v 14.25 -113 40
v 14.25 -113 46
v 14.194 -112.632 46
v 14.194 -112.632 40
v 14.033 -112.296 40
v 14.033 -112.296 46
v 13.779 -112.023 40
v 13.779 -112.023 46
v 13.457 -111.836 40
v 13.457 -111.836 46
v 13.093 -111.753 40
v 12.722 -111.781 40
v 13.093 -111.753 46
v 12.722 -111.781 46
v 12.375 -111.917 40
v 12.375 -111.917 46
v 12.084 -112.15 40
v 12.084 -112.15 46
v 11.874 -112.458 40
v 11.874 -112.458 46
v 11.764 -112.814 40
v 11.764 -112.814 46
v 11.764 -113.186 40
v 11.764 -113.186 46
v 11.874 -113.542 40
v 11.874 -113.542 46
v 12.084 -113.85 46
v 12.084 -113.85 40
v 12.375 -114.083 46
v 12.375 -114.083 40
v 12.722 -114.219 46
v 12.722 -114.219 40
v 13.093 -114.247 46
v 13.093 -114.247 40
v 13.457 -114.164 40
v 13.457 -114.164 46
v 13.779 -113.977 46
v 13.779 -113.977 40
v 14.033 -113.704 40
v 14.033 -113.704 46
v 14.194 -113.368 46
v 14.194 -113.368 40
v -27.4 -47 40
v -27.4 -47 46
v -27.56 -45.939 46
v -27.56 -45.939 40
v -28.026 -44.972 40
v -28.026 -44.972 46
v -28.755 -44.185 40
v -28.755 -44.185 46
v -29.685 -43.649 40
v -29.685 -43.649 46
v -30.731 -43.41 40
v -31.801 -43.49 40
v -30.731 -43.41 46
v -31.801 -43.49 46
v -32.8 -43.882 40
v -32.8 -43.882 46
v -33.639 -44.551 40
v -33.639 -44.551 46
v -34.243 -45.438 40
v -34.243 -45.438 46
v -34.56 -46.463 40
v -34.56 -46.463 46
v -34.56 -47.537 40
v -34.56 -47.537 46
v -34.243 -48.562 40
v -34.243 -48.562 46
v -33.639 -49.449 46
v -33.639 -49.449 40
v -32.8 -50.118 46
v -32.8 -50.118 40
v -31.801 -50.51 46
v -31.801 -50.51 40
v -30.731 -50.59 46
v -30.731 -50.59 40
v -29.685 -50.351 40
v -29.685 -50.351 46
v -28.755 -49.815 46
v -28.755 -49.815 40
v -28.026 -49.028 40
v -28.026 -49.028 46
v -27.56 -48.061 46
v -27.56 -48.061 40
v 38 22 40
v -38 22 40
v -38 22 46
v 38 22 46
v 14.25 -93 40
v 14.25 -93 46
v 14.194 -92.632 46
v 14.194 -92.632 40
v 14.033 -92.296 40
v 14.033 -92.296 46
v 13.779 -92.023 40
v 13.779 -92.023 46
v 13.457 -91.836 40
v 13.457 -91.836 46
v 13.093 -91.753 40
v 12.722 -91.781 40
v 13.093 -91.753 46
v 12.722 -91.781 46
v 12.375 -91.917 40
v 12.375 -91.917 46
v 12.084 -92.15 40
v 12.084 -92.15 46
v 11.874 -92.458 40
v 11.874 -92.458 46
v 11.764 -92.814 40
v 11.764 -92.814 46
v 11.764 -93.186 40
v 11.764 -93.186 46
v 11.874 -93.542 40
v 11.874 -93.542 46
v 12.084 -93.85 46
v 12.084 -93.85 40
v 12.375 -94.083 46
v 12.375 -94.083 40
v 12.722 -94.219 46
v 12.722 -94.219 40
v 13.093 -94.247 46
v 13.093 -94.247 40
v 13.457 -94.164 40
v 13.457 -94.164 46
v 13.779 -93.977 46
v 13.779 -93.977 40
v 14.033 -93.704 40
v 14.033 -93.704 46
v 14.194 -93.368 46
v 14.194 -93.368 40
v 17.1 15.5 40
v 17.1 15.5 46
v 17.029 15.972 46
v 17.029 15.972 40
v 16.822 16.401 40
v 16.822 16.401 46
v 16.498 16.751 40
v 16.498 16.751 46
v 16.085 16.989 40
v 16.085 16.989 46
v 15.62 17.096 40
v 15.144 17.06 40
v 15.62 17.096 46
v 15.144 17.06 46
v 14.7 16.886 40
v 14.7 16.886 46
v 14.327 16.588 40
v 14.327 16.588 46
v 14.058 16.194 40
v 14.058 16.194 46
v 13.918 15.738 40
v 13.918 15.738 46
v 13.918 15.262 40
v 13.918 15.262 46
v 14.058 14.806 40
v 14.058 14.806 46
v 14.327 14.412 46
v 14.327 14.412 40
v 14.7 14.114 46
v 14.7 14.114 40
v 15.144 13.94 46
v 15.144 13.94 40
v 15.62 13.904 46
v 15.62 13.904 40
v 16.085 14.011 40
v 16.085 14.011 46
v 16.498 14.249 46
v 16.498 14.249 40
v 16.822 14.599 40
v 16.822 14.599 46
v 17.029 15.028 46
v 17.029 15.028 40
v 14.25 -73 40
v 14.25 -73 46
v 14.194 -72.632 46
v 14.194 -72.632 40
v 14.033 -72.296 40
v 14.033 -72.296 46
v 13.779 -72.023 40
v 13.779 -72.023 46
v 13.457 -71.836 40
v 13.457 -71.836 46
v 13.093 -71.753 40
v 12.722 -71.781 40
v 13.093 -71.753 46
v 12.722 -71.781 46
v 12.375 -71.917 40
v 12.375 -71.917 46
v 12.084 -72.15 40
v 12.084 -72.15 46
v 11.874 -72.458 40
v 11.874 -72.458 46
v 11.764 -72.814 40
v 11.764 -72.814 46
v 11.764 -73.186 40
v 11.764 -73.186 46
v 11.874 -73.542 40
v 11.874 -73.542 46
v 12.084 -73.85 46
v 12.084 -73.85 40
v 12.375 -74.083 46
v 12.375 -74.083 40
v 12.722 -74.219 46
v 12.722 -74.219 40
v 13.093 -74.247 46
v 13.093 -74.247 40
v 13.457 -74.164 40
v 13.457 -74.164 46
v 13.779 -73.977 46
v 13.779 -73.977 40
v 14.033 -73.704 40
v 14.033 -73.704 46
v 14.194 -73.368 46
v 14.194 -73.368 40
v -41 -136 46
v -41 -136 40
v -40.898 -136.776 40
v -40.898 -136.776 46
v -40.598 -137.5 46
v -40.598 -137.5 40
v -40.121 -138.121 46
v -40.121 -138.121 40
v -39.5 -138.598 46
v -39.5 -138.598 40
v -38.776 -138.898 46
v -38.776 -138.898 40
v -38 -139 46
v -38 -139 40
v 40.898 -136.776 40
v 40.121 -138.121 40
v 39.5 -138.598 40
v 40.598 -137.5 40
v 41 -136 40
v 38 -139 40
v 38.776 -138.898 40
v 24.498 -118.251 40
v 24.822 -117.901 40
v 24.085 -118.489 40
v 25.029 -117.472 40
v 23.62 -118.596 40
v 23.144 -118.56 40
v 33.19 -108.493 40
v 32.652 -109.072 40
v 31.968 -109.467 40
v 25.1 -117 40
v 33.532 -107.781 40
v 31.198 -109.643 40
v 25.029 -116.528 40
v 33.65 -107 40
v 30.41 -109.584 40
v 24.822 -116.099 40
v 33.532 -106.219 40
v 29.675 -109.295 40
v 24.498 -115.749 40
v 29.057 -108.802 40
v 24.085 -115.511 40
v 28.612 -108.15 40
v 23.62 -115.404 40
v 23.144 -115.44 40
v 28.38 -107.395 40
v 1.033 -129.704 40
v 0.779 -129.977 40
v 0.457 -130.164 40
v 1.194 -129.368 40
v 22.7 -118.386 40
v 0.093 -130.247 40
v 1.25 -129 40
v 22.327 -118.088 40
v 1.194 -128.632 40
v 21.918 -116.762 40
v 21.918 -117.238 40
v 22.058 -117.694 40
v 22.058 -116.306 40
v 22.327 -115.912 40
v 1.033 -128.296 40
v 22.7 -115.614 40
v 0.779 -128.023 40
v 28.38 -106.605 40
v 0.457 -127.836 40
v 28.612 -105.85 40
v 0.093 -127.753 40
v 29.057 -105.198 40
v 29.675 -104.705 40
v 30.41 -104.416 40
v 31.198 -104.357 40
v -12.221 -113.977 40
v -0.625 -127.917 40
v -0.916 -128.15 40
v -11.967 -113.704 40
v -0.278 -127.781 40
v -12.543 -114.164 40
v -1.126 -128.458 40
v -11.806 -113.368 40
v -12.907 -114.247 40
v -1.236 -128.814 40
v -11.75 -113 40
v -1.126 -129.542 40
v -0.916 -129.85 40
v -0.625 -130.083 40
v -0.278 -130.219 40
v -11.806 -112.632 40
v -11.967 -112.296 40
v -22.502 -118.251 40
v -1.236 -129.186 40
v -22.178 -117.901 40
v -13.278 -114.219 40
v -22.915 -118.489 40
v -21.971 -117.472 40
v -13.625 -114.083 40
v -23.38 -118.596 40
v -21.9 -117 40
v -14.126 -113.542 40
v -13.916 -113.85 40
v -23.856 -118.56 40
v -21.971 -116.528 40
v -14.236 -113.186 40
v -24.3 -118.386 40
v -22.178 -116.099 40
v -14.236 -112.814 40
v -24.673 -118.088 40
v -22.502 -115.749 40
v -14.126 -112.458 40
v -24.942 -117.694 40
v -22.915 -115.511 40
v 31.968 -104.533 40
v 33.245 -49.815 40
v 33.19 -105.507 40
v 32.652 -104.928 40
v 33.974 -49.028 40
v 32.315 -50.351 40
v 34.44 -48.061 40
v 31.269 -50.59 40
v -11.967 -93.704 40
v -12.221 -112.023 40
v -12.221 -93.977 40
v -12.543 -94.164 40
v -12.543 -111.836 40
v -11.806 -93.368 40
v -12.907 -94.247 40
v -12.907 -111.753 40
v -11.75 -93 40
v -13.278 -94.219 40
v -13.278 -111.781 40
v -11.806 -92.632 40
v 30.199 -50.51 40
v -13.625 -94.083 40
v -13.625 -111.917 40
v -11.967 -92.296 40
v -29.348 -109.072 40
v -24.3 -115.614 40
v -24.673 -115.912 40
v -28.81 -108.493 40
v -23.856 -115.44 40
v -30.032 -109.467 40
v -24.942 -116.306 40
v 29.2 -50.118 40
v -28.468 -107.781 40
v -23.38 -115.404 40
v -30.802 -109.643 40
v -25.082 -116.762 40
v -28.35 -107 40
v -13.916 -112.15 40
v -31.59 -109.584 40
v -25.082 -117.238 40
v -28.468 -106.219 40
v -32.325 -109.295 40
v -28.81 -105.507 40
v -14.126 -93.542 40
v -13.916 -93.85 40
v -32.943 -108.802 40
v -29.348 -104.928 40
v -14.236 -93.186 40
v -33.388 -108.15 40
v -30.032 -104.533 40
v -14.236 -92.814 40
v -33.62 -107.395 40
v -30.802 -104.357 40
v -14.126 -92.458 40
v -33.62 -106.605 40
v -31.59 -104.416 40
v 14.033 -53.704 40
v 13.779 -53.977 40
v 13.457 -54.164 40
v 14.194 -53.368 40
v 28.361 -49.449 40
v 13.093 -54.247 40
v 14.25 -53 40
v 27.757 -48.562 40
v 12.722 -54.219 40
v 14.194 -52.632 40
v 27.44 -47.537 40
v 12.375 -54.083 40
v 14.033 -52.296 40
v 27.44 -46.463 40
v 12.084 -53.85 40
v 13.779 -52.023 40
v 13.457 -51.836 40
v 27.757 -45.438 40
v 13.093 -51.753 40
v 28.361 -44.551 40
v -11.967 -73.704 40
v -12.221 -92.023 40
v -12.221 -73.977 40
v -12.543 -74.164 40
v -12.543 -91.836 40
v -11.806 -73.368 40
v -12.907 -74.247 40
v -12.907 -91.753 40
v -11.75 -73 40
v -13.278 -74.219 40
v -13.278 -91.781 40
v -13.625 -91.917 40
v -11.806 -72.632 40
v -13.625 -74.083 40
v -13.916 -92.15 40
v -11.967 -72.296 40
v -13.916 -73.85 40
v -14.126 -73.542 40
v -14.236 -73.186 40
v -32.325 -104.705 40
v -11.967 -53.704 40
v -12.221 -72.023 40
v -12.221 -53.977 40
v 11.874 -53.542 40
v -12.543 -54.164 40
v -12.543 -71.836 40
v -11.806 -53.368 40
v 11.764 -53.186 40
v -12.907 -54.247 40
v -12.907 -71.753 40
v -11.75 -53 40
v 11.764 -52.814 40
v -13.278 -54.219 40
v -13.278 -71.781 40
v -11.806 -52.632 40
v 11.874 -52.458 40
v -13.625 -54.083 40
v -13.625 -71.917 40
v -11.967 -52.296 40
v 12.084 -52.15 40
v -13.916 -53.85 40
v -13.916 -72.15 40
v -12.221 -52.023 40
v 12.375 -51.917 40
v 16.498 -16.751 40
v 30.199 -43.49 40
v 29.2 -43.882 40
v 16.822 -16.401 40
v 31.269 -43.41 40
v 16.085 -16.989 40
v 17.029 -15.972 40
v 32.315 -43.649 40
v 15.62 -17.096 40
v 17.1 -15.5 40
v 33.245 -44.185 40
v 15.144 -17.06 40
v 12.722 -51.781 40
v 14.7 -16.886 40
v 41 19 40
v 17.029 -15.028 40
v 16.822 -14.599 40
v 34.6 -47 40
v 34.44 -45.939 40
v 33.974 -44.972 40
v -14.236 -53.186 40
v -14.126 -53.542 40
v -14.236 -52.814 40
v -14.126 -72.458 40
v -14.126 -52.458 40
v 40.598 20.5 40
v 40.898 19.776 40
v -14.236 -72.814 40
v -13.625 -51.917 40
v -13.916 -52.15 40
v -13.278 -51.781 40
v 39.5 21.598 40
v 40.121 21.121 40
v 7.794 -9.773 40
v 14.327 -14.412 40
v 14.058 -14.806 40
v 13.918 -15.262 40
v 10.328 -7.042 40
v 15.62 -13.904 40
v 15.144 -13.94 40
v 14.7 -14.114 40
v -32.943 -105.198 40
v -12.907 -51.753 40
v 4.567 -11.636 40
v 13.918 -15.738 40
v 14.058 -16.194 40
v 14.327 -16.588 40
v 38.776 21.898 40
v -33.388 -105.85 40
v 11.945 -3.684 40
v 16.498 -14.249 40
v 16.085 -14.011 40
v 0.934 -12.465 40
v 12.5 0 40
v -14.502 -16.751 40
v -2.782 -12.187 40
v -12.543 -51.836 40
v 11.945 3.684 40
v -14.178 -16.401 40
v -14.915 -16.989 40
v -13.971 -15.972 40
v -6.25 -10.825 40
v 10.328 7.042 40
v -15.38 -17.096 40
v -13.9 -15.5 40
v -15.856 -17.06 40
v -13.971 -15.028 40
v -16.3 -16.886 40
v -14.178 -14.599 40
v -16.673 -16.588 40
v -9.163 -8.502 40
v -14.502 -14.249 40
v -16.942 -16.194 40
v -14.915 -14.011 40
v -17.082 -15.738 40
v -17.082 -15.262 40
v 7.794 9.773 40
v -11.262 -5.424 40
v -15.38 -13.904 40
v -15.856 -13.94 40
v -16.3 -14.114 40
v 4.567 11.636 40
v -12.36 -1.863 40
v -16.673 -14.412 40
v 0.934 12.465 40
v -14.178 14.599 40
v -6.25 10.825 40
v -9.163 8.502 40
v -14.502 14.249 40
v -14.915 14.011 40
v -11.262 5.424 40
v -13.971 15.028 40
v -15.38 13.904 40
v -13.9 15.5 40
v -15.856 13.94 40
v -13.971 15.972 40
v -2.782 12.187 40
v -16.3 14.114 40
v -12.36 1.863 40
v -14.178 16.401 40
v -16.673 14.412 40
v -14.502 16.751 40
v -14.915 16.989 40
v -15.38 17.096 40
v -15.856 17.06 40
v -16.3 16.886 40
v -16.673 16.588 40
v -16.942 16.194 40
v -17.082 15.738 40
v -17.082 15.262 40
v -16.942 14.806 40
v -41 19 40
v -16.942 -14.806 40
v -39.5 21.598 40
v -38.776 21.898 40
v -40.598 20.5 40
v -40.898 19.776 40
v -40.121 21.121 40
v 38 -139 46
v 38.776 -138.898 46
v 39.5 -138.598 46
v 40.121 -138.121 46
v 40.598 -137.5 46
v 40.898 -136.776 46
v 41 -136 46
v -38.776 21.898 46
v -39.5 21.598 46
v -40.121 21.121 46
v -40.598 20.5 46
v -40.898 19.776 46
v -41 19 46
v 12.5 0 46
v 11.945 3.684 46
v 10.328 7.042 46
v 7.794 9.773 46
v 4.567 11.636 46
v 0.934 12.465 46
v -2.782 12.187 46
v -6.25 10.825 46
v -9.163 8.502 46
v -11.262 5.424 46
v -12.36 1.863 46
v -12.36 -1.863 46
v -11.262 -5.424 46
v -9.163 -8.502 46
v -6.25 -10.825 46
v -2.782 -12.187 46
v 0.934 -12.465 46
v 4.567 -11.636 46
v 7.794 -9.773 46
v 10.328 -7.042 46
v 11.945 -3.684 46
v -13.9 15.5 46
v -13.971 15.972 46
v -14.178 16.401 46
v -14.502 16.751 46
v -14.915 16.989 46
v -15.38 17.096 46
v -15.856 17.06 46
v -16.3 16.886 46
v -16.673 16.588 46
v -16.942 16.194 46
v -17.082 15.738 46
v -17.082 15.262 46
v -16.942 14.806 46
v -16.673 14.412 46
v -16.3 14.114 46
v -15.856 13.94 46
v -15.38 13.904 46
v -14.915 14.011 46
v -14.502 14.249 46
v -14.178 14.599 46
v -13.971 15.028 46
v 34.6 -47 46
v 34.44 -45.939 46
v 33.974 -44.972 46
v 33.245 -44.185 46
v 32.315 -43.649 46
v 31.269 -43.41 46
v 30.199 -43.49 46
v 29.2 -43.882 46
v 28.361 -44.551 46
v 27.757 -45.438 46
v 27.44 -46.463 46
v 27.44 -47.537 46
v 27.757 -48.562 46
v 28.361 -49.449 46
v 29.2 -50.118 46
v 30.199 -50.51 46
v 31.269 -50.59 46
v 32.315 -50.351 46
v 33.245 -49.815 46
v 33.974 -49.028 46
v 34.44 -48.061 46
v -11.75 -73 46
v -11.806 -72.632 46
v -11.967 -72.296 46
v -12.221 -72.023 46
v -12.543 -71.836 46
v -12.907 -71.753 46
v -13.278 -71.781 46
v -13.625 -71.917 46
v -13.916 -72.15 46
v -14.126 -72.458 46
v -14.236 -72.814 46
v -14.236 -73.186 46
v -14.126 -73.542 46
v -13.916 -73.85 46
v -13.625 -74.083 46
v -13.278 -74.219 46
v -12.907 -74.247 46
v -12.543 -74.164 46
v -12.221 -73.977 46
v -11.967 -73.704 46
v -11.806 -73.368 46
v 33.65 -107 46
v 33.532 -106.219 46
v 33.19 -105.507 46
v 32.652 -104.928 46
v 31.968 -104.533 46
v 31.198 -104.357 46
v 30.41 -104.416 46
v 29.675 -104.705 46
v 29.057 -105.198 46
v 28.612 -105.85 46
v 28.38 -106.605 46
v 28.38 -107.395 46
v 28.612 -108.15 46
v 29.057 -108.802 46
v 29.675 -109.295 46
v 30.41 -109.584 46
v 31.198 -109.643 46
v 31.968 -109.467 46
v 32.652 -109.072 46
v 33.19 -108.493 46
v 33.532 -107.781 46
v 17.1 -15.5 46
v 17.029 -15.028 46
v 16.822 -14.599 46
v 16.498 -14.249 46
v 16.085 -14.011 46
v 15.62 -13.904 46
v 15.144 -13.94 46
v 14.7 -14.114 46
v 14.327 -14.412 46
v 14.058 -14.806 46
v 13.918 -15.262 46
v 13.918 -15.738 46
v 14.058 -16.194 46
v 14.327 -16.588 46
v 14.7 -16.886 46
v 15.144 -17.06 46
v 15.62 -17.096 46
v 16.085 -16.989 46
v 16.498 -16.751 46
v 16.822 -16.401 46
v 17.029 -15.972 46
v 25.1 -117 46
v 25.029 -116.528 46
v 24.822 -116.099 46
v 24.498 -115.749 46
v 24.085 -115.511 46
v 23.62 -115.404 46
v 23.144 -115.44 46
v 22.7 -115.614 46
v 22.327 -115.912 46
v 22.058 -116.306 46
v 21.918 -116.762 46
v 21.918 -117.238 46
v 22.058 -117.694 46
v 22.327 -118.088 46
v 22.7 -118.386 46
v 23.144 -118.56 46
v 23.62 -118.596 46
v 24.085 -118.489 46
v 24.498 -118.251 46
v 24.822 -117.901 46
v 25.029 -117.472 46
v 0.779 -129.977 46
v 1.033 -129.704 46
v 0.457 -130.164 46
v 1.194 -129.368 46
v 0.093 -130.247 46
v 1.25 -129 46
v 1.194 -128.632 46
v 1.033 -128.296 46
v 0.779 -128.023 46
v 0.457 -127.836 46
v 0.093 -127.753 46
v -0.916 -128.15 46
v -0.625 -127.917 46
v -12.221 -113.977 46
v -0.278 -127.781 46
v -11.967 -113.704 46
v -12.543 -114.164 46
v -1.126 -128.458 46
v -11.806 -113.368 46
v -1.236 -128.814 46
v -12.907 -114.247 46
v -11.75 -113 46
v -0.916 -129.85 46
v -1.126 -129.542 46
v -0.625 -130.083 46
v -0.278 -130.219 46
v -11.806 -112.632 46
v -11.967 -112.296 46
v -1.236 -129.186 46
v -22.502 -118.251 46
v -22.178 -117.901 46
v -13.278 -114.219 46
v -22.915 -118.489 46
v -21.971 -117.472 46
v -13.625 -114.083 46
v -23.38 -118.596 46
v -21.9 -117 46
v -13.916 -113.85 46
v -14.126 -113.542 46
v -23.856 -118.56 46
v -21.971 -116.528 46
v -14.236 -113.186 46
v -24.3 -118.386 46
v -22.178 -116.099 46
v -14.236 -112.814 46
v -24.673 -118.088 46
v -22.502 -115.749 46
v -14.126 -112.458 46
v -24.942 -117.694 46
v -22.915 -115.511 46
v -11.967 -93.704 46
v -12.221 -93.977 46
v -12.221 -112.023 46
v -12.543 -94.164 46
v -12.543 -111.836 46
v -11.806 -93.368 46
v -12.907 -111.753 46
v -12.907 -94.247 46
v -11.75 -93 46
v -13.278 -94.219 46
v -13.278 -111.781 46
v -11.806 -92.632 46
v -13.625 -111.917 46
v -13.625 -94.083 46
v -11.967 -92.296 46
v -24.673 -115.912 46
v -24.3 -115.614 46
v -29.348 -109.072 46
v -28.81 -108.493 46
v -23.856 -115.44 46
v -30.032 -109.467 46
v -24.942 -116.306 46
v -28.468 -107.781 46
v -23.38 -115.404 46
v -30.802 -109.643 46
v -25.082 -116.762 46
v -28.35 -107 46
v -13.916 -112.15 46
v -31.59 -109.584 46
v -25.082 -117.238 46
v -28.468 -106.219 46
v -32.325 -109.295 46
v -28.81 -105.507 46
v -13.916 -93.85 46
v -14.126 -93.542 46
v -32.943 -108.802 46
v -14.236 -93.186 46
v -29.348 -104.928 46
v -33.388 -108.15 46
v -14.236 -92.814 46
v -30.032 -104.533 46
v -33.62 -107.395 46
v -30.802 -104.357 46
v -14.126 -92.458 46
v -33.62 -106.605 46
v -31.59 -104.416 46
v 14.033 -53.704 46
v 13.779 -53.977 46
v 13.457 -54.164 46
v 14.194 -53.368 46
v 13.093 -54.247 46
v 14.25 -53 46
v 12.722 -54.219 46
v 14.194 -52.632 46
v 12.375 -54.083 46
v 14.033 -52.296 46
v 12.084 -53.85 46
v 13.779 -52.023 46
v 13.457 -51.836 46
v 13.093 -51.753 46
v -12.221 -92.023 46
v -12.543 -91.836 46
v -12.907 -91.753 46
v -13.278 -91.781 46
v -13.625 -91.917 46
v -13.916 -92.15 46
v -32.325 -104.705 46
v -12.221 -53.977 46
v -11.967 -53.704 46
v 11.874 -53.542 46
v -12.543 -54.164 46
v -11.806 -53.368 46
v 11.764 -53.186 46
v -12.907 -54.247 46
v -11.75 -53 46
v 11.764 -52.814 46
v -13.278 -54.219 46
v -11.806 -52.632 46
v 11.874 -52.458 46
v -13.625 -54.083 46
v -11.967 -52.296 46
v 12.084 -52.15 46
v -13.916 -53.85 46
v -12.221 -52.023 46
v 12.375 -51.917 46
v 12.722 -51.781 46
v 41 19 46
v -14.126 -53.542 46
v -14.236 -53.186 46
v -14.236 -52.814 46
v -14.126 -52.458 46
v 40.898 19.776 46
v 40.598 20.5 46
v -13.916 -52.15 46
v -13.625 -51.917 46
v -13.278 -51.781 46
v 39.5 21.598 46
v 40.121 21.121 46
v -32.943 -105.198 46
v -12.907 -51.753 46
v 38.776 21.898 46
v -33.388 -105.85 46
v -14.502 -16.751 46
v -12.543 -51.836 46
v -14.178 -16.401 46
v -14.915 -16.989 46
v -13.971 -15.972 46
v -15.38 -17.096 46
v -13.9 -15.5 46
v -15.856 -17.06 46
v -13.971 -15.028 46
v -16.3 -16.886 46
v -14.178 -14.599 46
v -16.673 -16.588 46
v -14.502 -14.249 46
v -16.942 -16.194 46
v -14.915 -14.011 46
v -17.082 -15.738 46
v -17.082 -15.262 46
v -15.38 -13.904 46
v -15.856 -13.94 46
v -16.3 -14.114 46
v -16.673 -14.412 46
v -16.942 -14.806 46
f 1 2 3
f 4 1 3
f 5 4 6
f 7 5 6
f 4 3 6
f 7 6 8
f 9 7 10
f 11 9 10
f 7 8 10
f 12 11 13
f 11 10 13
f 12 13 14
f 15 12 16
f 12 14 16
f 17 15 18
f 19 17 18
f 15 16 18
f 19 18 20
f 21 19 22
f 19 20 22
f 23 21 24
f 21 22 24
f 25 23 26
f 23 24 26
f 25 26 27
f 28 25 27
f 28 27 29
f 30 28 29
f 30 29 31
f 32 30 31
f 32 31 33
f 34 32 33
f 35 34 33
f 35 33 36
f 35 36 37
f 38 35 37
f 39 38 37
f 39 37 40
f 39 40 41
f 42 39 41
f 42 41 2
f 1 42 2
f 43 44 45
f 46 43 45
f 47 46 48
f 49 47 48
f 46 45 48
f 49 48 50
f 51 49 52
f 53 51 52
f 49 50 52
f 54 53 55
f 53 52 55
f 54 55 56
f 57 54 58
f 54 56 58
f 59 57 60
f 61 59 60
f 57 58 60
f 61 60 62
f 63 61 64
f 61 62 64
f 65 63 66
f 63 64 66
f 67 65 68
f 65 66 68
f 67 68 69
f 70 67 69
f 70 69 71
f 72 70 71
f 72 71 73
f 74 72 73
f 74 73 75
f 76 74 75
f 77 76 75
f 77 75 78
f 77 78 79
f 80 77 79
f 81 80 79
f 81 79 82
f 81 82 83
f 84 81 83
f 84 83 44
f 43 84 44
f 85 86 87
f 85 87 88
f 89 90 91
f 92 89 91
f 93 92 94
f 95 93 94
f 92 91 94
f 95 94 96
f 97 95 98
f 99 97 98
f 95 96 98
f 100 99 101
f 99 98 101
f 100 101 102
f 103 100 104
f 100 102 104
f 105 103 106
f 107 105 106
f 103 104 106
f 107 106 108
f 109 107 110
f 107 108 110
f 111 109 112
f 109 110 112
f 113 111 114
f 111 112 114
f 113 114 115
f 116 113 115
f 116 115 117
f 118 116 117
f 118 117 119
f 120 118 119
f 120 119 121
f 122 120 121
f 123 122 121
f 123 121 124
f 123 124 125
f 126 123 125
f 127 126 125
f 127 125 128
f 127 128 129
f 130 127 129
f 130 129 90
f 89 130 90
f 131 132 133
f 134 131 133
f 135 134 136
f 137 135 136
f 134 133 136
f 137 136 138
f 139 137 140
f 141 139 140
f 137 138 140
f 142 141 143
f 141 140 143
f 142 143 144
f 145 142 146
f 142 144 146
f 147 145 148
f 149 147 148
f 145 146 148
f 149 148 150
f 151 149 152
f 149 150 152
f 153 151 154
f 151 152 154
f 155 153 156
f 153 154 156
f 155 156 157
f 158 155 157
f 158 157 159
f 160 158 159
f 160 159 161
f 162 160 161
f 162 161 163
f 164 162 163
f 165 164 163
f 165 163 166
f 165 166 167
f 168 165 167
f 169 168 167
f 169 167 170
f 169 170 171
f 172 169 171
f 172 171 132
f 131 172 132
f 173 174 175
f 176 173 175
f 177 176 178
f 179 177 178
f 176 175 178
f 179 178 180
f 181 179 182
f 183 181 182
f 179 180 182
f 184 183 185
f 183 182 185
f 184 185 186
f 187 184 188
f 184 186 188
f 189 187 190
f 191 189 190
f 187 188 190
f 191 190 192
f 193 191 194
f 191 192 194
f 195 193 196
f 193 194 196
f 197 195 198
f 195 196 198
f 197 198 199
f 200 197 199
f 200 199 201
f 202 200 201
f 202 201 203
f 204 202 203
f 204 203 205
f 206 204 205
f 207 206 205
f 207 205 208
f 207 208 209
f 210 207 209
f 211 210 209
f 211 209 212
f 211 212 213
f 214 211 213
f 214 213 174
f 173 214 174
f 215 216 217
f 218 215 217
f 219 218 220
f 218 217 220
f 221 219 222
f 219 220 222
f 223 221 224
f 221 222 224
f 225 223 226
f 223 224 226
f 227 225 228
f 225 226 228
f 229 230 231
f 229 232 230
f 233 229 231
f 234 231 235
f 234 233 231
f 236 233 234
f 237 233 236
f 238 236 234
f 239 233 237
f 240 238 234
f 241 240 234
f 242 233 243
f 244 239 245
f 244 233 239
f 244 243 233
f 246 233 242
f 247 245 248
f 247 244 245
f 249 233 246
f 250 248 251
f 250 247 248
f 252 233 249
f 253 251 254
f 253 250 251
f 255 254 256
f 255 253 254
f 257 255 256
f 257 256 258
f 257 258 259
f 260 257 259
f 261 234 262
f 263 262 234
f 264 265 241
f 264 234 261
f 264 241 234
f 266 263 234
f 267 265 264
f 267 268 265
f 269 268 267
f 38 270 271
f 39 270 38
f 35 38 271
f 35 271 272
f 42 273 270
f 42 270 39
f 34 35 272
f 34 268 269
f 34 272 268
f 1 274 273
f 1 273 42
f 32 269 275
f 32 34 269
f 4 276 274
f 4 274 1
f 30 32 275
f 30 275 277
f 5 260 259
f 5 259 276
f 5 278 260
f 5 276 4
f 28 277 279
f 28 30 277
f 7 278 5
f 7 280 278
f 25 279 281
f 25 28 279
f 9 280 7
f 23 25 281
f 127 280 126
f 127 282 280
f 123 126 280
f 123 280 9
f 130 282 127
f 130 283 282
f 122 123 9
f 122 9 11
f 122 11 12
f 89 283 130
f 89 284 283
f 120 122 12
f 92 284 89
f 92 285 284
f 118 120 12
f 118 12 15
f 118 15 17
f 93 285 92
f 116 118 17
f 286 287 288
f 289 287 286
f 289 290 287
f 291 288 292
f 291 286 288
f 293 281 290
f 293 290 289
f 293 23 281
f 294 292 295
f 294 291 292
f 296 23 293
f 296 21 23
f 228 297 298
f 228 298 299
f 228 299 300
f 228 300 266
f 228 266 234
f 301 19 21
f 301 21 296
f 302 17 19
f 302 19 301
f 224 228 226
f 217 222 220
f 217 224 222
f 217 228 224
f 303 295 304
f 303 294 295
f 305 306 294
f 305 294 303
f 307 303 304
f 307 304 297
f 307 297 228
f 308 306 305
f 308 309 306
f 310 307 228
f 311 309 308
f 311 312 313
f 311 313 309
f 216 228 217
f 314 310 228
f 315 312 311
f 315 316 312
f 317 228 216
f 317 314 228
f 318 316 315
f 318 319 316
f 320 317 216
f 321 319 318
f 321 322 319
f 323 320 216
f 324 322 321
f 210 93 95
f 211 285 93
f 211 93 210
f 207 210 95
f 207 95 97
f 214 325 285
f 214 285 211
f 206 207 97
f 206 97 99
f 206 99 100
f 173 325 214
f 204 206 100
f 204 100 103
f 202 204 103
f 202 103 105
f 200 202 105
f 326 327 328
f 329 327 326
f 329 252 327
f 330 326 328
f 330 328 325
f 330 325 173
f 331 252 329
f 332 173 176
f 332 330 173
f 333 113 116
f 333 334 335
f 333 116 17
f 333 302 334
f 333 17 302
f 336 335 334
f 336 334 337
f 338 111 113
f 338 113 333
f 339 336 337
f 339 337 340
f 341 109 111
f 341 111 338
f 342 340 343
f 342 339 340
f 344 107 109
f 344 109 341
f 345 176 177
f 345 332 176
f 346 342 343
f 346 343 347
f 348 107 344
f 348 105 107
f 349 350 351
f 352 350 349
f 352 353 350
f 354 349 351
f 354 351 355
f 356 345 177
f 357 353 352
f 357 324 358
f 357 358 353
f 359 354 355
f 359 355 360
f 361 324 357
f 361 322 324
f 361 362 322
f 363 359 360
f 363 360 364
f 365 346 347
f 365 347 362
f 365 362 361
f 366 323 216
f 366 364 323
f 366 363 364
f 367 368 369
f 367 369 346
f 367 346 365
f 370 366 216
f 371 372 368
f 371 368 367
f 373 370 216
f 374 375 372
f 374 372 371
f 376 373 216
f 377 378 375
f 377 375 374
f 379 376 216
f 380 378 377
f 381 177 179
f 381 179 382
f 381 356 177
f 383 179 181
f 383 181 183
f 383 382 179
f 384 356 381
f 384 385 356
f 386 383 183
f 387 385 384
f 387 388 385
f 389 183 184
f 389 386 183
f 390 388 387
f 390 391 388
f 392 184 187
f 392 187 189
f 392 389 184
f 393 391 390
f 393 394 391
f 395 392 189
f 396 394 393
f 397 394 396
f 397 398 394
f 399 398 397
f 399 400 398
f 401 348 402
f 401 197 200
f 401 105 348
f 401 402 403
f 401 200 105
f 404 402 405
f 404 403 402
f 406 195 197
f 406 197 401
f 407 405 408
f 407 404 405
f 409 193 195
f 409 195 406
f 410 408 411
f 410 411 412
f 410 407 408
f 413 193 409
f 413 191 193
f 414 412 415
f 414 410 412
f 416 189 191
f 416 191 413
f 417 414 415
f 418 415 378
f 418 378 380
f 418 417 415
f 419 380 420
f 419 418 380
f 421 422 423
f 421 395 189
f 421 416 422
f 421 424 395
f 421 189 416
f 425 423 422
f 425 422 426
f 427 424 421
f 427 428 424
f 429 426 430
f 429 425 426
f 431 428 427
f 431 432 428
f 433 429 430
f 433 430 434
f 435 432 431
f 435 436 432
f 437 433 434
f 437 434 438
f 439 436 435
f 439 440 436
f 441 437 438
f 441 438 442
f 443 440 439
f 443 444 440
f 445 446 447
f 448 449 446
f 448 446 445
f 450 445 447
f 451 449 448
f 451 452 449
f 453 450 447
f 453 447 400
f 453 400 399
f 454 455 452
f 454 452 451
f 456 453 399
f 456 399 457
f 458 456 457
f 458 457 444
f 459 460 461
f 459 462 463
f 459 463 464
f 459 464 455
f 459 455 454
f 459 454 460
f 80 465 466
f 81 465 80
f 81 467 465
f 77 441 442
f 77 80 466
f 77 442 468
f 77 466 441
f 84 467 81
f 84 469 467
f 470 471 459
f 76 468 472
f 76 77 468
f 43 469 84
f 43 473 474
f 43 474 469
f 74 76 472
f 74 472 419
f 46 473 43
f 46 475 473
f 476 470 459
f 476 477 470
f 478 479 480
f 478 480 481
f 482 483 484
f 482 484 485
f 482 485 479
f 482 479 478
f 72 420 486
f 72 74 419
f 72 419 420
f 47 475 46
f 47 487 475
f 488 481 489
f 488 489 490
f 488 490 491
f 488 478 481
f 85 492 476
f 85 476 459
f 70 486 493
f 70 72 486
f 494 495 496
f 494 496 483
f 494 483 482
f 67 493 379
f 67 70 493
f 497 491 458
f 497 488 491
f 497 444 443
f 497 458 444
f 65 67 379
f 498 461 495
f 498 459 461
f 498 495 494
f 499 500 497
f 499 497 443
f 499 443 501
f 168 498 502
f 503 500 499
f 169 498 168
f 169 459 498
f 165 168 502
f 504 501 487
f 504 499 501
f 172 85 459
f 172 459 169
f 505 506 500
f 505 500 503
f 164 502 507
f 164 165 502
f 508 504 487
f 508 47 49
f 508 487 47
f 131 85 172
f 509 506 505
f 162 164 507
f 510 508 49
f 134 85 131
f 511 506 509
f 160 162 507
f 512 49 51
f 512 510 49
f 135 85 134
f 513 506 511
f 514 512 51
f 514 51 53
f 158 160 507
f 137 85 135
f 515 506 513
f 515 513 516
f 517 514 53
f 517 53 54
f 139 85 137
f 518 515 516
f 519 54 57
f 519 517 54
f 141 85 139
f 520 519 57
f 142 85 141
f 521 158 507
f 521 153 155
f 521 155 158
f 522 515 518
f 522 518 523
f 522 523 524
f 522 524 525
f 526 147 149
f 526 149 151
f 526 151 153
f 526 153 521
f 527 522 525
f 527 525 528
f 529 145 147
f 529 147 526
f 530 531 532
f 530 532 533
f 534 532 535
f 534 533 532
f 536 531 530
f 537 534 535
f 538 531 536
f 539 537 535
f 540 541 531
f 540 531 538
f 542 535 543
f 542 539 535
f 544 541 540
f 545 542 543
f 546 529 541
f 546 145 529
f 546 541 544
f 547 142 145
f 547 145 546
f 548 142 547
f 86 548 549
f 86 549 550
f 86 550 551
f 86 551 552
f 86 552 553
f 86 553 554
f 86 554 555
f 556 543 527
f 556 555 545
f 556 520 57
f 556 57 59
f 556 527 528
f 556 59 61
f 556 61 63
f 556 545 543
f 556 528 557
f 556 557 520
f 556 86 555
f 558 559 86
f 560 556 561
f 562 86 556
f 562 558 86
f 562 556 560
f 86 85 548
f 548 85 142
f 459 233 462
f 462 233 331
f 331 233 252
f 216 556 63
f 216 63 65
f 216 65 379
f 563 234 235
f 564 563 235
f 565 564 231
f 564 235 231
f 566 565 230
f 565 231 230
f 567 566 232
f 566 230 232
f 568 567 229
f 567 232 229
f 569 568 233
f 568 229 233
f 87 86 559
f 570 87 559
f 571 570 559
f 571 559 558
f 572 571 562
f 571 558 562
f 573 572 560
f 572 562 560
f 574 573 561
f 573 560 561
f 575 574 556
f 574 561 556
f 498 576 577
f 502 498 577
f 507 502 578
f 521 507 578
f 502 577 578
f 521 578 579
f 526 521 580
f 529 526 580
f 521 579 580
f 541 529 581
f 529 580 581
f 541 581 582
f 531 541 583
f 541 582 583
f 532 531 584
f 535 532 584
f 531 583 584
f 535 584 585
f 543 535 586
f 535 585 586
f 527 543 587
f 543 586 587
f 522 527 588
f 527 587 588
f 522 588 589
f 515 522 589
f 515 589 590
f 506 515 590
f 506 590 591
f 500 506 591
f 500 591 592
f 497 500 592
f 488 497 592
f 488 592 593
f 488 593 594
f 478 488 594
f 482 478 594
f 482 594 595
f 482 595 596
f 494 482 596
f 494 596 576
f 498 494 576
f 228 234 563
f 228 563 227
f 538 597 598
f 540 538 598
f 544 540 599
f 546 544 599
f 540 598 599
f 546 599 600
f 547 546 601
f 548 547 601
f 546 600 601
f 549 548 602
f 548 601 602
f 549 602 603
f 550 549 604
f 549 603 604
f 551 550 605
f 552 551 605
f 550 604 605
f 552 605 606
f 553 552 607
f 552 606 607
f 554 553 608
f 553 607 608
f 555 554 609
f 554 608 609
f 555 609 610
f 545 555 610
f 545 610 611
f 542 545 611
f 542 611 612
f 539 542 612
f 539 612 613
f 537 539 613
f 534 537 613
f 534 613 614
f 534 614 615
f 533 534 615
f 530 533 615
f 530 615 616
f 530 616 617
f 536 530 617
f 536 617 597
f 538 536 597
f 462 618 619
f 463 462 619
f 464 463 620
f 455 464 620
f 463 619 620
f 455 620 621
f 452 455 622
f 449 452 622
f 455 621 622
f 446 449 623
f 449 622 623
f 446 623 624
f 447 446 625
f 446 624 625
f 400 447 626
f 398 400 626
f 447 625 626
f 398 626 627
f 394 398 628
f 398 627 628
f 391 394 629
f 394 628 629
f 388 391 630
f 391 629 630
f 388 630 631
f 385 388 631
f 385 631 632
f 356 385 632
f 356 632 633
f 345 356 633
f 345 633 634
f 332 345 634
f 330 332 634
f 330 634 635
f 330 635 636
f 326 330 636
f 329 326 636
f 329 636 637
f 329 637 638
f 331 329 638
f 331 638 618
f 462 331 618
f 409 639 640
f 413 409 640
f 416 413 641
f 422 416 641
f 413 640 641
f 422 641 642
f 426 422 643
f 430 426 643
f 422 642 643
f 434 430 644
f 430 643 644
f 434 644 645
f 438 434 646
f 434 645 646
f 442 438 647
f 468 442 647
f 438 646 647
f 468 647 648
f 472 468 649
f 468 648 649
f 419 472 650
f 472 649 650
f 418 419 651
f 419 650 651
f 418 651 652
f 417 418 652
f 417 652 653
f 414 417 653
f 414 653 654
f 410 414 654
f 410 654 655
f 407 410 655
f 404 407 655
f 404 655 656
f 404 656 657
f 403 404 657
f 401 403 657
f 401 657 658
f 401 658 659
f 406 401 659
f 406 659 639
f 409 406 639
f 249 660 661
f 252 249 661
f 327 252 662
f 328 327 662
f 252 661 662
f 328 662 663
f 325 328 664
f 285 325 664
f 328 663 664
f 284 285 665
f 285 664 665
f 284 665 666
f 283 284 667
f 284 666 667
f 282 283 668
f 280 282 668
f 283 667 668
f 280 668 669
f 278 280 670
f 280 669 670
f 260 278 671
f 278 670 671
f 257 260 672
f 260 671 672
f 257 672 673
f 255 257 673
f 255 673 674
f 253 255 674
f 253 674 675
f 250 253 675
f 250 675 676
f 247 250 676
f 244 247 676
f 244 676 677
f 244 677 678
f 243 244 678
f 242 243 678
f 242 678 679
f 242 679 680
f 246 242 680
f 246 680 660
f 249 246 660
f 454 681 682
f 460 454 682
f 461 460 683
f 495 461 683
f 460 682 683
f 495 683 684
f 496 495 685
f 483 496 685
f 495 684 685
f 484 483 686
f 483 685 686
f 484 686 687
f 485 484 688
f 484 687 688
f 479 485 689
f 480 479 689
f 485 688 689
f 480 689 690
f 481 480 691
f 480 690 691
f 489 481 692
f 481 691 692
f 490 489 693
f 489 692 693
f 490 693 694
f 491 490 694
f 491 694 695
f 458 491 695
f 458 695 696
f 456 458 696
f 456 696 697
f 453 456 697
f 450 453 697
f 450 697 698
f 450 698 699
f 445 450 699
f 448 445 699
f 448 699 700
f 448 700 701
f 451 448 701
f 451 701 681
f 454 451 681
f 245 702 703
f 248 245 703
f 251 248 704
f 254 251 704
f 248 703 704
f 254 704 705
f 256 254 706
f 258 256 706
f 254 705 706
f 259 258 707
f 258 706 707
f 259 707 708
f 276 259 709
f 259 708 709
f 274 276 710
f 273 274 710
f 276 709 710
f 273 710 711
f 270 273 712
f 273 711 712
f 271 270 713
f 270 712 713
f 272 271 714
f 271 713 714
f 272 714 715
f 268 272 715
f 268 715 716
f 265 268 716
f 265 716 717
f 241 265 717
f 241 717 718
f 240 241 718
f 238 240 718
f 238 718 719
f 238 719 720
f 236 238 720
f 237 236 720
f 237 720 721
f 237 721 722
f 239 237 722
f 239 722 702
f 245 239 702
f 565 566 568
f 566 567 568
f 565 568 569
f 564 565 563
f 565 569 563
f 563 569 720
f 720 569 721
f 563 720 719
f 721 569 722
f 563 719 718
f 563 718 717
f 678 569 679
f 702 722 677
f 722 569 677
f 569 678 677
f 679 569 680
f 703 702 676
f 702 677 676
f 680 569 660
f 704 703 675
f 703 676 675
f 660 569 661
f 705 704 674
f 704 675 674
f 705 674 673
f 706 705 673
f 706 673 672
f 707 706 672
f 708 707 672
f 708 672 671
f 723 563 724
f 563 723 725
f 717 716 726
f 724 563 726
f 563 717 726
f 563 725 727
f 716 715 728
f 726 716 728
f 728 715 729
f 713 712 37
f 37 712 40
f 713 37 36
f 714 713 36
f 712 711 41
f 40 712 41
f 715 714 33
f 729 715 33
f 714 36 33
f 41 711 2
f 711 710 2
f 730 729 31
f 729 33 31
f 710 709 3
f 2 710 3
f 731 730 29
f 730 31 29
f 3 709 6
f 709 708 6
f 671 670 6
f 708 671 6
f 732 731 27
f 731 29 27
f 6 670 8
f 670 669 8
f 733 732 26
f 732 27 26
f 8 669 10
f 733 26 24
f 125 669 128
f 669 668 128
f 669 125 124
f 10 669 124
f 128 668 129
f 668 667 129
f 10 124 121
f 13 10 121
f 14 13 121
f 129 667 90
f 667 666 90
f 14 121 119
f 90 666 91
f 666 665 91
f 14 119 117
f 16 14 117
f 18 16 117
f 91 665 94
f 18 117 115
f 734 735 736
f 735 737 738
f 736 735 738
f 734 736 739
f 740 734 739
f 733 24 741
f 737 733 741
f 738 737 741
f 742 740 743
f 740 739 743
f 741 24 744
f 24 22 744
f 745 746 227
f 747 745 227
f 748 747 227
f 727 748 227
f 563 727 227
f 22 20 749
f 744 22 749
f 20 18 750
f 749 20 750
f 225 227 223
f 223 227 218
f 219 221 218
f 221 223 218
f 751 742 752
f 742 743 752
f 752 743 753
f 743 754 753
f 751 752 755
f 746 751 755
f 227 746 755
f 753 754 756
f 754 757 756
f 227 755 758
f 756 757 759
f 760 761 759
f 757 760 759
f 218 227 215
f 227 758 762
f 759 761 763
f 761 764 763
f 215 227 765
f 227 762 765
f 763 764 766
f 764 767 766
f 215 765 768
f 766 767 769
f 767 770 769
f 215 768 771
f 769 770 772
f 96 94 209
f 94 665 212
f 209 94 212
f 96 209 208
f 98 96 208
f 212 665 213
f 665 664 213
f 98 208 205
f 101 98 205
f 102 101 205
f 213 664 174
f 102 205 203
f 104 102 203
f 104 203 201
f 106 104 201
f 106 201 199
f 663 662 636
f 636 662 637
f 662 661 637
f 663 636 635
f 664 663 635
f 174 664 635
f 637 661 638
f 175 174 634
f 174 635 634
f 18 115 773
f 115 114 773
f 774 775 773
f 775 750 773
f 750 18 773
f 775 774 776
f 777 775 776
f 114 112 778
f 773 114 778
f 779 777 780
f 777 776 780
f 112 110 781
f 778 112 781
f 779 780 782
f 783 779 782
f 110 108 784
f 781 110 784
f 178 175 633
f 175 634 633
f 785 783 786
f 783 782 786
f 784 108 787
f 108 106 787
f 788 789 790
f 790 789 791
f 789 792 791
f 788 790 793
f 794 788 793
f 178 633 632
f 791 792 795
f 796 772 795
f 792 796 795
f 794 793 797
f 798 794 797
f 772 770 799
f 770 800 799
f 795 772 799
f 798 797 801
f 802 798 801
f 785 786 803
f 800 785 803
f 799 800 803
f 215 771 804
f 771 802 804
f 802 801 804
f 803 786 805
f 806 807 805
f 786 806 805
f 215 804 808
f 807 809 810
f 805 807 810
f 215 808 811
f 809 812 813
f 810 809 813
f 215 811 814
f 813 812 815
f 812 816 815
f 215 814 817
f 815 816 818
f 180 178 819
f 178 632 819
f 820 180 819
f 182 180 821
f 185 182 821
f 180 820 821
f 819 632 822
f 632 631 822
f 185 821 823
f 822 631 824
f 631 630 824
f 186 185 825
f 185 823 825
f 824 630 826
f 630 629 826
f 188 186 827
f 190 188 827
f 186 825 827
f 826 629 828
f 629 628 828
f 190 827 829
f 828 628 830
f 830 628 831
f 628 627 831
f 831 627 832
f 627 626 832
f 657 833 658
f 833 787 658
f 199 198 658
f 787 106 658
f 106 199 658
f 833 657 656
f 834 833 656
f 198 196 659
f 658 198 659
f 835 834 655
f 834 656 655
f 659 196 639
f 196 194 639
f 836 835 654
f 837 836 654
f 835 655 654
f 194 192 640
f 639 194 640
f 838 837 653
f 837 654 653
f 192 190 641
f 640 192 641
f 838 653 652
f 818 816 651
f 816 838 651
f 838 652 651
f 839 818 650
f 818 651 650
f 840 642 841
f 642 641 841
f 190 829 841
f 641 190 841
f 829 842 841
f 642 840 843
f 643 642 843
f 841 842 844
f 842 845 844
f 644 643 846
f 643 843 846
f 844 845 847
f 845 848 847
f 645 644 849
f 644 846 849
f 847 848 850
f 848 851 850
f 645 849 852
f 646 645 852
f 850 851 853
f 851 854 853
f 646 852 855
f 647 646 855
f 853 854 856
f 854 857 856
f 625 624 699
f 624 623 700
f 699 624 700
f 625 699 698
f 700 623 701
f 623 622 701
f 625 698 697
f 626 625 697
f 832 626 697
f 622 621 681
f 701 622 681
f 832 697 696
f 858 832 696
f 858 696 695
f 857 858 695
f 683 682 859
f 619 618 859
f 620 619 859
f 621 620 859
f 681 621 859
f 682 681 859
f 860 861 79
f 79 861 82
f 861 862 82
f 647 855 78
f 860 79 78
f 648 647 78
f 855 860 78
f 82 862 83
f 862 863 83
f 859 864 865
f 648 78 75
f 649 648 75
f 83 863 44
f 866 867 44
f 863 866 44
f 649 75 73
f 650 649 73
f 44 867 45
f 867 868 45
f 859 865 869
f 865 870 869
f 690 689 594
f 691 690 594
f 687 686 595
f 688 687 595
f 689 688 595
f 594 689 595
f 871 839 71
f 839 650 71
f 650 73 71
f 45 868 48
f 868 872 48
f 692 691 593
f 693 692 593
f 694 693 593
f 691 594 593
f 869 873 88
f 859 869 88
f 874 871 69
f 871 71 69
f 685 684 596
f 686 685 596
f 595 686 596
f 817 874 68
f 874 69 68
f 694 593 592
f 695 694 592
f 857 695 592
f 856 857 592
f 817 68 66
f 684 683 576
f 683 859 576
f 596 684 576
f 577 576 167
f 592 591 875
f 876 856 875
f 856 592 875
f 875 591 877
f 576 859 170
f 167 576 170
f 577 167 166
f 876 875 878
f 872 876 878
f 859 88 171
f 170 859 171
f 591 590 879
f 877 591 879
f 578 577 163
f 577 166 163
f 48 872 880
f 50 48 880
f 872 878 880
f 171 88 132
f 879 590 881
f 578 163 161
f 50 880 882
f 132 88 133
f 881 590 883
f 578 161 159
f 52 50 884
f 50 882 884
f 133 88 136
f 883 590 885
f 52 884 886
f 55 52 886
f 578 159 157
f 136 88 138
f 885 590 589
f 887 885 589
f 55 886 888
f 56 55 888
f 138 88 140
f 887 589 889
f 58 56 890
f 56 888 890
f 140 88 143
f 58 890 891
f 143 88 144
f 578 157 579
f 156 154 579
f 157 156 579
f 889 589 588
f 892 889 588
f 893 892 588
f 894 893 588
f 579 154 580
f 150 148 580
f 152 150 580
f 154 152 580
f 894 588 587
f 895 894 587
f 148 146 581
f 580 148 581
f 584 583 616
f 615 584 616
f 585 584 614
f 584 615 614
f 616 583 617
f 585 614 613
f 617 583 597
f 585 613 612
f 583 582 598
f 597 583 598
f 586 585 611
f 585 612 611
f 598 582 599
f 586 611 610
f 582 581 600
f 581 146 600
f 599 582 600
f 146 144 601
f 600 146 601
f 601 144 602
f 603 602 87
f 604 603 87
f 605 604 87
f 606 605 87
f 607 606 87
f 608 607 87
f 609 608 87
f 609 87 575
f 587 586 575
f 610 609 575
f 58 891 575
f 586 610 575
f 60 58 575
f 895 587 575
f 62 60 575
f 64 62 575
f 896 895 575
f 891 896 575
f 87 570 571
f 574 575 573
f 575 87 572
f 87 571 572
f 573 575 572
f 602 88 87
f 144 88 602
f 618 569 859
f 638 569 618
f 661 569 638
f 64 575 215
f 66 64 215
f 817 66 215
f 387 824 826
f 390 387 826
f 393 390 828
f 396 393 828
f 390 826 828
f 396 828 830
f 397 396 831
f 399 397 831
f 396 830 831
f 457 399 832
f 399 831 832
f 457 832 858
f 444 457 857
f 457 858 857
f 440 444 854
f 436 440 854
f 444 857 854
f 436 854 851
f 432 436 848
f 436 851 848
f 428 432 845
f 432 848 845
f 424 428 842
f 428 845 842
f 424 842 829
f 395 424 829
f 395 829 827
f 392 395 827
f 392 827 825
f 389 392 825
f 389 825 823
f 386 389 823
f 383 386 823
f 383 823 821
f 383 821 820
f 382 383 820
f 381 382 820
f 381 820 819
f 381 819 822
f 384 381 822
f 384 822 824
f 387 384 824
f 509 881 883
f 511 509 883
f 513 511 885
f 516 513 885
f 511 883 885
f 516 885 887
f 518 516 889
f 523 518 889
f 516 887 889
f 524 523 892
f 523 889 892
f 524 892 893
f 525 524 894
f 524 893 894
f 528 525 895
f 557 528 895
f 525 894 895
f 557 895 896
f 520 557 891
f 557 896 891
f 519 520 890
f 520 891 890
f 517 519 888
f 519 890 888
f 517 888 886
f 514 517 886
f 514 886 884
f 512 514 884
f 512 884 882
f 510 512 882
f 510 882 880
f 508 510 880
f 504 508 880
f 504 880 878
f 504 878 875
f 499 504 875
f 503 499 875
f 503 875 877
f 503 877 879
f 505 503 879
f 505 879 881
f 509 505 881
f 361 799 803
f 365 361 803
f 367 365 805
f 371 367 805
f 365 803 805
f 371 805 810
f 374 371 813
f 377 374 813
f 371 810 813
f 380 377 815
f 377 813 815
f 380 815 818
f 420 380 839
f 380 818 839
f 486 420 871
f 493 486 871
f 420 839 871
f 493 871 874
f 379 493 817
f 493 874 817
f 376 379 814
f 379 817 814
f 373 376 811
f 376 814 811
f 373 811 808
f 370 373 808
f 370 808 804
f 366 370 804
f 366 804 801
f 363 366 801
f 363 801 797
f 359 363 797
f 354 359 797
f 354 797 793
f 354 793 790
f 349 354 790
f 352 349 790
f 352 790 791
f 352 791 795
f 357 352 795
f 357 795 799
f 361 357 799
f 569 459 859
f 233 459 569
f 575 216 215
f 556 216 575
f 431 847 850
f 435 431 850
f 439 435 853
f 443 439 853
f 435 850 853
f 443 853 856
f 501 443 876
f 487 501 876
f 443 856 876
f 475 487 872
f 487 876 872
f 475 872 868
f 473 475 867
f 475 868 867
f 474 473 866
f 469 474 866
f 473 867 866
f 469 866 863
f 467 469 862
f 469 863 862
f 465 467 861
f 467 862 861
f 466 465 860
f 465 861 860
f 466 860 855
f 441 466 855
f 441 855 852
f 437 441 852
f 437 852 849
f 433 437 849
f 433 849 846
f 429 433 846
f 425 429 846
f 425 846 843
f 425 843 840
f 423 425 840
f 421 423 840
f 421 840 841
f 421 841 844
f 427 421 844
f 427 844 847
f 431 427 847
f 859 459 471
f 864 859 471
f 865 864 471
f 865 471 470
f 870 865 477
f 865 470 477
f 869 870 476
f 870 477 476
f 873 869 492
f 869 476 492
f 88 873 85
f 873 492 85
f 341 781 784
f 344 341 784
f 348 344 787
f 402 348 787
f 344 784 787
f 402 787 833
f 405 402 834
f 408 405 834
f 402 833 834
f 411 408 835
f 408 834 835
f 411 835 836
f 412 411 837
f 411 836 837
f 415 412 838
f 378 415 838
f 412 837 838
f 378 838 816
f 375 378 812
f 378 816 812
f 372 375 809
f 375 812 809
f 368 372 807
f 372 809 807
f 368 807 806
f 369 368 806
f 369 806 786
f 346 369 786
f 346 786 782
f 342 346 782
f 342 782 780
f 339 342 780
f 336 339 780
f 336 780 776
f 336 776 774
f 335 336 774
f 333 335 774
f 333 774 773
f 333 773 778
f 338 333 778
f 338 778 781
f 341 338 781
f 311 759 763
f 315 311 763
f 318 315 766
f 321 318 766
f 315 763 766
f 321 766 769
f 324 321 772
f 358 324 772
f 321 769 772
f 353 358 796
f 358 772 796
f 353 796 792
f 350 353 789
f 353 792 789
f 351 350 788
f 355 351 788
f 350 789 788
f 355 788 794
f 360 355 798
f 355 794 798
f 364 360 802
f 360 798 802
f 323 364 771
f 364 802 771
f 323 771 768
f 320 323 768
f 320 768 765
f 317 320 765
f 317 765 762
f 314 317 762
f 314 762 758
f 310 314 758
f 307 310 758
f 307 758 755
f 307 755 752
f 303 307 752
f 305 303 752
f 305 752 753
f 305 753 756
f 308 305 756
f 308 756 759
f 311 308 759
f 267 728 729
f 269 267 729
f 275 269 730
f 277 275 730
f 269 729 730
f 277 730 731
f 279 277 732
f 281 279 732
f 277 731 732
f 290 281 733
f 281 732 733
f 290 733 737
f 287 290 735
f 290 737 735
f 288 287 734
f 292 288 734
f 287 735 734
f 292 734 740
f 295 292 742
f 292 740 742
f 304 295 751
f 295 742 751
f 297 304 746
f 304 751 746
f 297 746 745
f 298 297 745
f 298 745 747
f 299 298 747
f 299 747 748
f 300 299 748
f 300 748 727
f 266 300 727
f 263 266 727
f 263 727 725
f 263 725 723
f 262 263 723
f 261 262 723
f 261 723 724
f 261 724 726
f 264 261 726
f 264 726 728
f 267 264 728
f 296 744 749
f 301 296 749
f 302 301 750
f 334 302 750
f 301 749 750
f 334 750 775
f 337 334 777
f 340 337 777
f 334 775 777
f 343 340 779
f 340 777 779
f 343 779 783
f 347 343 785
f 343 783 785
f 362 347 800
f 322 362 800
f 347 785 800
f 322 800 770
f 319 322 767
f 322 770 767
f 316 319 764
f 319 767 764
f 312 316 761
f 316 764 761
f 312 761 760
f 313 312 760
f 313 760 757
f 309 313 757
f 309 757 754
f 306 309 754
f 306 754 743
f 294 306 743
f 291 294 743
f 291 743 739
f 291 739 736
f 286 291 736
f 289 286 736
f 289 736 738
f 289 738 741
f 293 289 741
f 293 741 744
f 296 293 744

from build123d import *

# Parameters (mm, degrees)
PAD009_DEPTH    = 6
SKETCH051_R     = 1.6
HOLE023_DEPTH   = 25
SKETCH052_R     = 12.5
POCKET005_DEPTH = 6.001
SKETCH057_R     = 1.25
HOLE024_DEPTH   = 25
SKETCH054_R     = 1.25
HOLE025_DEPTH   = 25
SKETCH058_R     = 3.6
HOLE026_DEPTH   = 25
SKETCH056_R     = 2.65
HOLE027_DEPTH   = 25
SKETCH062_R     = 1.6
HOLE031_DEPTH   = 25


with BuildPart() as part:
    # Sketch059 → Pad009 (new body)
    with BuildSketch(Plane.XY):
        with BuildLine():
            Line((-38, 22), (38, 22))
            ThreePointArc((41, 19), (40.12132, 21.12132), (38, 22))
            Line((41, 19), (41, -136))
            ThreePointArc((38, -139), (40.12132, -138.12132), (41, -136))
            Line((38, -139), (-38, -139))
            ThreePointArc((-41, -136), (-40.12132, -138.12132), (-38, -139))
            Line((-41, -136), (-41, 19))
            ThreePointArc((-38, 22), (-40.12132, 21.12132), (-41, 19))
        make_face()
    extrude(amount=PAD009_DEPTH)

    # Sketch051 (on Face10 of Pad009) → Hole023 (cut)
    with BuildSketch(Plane.XY.offset(6)):
        with Locations((-15.5, 15.5)):
            Circle(SKETCH051_R)
        with Locations((15.5, 15.5)):
            Circle(SKETCH051_R)
        with Locations((-15.5, -15.5)):
            Circle(SKETCH051_R)
        with Locations((15.5, -15.5)):
            Circle(SKETCH051_R)
    extrude(amount=-HOLE023_DEPTH, mode=Mode.SUBTRACT)

    # Sketch052 (on Face5 of Hole023) → Pocket005 (cut, through all)
    with BuildSketch(Plane.XY.offset(6)):
        Circle(SKETCH052_R)
    extrude(amount=-POCKET005_DEPTH, mode=Mode.SUBTRACT)

    # Sketch057 (on Face5 of Pocket005) → Hole024 (cut)
    with BuildSketch(Plane.XY.offset(6)):
        with Locations((-13, -53)):
            Circle(SKETCH057_R)
        with Locations((-13, -73)):
            Circle(SKETCH057_R)
        with Locations((-13, -93)):
            Circle(SKETCH057_R)
        with Locations((-13, -113)):
            Circle(SKETCH057_R)
        with Locations((13, -53)):
            Circle(SKETCH057_R)
        with Locations((13, -73)):
            Circle(SKETCH057_R)
        with Locations((13, -93)):
            Circle(SKETCH057_R)
        with Locations((13, -113)):
            Circle(SKETCH057_R)
    extrude(amount=-HOLE024_DEPTH, mode=Mode.SUBTRACT)

    # Sketch054 (on Face5 of Hole024) → Hole025 (cut)
    with BuildSketch(Plane.XY.offset(6)):
        with Locations((0, -129)):
            Circle(SKETCH054_R)
    extrude(amount=-HOLE025_DEPTH, mode=Mode.SUBTRACT)

    # Sketch058 (on Face5 of Hole025) → Hole026 (cut)
    with BuildSketch(Plane.XY.offset(6)):
        with Locations((-31, -47)):
            Circle(SKETCH058_R)
        with Locations((31, -47)):
            Circle(SKETCH058_R)
    extrude(amount=-HOLE026_DEPTH, mode=Mode.SUBTRACT)

    # Sketch056 (on Face5 of Hole026) → Hole027 (cut)
    with BuildSketch(Plane.XY.offset(6)):
        with Locations((-31, -107)):
            Circle(SKETCH056_R)
        with Locations((31, -107)):
            Circle(SKETCH056_R)
    extrude(amount=-HOLE027_DEPTH, mode=Mode.SUBTRACT)

    # Sketch062 (on Face5 of Hole027) → Hole031 (cut)
    with BuildSketch(Plane.XY.offset(6)):
        with Locations((-23.5, -117)):
            Circle(SKETCH062_R)
        with Locations((23.5, -117)):
            Circle(SKETCH062_R)
    extrude(amount=-HOLE031_DEPTH, mode=Mode.SUBTRACT)


with BuildPart() as part_1:
    # Body019 placement: moved
    add(part.part.moved(Location((0, 0, 40))))


solid = part_1.part
